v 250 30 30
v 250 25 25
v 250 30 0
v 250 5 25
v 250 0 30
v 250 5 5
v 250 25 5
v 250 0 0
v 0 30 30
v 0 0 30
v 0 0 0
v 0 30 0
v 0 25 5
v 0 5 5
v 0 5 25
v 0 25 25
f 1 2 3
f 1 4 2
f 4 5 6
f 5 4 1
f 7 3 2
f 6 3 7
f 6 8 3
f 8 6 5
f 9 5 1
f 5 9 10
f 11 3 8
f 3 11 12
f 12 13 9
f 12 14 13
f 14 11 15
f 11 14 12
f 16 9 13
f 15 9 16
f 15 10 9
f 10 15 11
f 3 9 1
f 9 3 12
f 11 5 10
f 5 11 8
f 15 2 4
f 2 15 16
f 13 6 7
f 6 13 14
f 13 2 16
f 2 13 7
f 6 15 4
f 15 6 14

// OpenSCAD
$fn = 32;

// ----------------------------------------------------------------------
// Box beam: 200-250 mm hollow beam
// ----------------------------------------------------------------------

// --- parameters (mm) ---
beam_l = 250;             // beam length, X
beam_w = 30;              // beam width, Y
beam_h = 30;              // beam height, Z
wall = 5;                 // wall thickness
fit_tol = 0.1;            // tolerance for press fits, mm
free_tol = 0.3;           // tolerance for clearance fits, mm

difference() {
  cube([beam_l, beam_w, beam_h]);
  translate([-1, wall, wall])
    cube([beam_l + 2, beam_w - 2 * wall, beam_h - 2 * wall]);
}
